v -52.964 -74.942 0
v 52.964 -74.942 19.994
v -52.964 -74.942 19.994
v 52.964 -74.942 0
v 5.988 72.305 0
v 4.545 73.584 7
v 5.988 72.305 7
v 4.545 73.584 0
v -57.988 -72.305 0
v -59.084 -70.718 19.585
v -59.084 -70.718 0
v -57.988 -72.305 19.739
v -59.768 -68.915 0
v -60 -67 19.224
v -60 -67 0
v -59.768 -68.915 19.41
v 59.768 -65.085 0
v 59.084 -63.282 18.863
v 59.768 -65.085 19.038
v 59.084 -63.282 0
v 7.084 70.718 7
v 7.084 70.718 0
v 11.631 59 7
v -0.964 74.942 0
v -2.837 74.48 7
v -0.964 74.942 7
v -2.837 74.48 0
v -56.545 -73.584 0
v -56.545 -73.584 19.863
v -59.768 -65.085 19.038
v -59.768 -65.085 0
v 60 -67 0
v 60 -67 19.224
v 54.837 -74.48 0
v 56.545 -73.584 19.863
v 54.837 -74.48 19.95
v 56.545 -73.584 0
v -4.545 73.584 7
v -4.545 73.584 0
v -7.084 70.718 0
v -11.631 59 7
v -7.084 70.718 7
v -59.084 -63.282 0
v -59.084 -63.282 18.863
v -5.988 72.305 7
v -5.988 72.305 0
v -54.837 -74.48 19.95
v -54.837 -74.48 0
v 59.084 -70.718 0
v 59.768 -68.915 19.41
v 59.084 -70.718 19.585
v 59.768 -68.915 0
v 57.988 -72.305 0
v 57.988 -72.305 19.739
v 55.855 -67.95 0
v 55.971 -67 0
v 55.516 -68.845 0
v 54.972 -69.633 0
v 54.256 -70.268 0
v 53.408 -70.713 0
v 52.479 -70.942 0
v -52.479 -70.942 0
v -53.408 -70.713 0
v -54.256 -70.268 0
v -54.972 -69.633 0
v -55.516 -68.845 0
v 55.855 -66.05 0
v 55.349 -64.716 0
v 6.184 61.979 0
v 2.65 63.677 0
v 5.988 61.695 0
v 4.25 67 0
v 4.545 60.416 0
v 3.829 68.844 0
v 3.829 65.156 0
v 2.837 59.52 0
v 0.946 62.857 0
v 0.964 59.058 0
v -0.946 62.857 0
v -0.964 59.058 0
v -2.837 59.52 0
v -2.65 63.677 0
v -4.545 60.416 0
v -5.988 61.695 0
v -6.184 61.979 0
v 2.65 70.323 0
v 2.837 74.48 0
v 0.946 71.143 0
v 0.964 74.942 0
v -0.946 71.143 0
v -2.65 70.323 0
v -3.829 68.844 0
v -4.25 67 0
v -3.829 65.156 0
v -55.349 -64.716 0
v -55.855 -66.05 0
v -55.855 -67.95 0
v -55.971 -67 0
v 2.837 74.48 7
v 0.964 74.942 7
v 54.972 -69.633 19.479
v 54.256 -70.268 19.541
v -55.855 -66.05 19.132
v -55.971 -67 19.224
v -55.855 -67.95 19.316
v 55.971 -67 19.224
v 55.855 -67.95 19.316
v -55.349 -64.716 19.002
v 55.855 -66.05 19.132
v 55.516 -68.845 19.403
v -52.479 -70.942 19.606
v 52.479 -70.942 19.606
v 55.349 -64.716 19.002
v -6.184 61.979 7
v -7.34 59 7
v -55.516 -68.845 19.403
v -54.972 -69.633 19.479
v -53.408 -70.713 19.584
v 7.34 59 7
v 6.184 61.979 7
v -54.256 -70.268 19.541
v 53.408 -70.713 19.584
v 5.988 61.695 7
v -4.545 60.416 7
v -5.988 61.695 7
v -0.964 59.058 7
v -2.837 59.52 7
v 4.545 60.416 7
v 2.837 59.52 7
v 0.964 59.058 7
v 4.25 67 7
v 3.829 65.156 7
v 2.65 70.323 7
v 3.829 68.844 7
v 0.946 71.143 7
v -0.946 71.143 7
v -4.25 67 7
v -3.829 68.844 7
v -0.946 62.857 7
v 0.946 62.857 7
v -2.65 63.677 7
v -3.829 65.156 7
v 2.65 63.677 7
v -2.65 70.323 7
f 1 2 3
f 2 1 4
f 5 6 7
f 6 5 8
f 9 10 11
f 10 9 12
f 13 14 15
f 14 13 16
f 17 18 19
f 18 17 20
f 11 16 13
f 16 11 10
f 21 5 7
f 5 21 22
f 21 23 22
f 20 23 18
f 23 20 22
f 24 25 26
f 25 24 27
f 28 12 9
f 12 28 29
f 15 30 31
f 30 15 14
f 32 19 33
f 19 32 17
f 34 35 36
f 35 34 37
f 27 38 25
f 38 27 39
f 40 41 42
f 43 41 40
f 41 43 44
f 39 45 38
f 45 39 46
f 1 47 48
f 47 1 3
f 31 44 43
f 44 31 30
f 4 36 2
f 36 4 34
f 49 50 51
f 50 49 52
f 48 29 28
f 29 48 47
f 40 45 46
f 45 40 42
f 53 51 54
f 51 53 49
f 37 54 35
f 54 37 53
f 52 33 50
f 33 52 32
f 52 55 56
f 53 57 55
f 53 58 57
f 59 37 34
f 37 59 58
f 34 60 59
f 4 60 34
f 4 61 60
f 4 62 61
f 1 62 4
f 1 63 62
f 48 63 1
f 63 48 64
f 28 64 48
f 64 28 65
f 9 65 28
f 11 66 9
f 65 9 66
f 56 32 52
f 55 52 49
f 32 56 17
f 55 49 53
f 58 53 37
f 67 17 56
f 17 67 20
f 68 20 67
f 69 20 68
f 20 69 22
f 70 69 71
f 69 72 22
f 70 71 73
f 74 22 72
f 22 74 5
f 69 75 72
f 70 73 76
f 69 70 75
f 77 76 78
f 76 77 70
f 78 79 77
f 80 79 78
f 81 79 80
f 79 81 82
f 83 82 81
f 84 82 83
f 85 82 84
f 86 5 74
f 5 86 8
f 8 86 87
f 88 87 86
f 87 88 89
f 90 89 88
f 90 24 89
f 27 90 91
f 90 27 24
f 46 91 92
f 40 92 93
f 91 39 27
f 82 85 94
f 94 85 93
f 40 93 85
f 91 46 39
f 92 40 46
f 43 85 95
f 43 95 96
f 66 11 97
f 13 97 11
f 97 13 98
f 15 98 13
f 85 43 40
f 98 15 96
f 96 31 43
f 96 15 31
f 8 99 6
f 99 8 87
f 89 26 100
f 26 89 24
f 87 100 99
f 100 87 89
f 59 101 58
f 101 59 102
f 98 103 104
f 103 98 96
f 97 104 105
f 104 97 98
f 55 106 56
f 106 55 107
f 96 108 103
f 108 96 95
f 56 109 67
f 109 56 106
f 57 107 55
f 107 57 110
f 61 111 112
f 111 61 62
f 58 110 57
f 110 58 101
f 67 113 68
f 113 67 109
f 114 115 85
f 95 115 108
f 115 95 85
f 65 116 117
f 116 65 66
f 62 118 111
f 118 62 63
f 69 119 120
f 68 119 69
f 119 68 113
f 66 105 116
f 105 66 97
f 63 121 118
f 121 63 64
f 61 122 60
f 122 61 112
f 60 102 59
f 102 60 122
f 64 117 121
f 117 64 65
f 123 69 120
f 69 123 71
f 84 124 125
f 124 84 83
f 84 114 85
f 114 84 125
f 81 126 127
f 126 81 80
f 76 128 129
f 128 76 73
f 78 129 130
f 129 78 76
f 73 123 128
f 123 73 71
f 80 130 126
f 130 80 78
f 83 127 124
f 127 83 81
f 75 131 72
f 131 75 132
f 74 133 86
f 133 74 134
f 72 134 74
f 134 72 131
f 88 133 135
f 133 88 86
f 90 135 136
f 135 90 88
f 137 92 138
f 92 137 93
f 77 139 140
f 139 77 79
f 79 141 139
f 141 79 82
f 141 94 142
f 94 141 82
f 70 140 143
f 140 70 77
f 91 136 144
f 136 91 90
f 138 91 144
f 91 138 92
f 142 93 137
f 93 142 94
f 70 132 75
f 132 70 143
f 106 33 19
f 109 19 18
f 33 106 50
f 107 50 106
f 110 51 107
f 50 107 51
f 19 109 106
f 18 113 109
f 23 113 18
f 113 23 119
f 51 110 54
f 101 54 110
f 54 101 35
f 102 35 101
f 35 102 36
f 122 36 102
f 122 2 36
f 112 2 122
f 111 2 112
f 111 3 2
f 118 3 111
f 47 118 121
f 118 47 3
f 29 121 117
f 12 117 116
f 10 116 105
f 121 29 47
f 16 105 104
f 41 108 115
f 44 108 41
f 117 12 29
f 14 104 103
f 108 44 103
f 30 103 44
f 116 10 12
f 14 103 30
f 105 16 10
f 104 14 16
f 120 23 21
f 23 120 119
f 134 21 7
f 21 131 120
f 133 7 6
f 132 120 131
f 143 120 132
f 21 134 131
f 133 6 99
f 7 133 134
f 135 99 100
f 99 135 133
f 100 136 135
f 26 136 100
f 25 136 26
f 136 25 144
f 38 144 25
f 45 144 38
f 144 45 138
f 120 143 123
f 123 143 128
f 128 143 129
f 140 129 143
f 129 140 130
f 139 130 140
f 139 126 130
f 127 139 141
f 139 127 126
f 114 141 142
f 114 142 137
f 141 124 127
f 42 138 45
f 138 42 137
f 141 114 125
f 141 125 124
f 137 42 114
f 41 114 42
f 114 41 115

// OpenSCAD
height = 150;
width = 120;
baseDepth = 20;
topDepth = 7;
wallThickness = 4;
rodDiameter = 8;
rodRadius = (rodDiameter+0.5)/2; // extra .5mm for clearance
cornerRadius = rodDiameter;

module triangle() {
	hull() {
		translate([0, height/2-cornerRadius, 0]) {
			circle(cornerRadius);
		}
		translate([-width/2+cornerRadius, -height/2+cornerRadius, 0]) {
			circle(cornerRadius);
		}
		translate([width/2-cornerRadius, -height/2+cornerRadius, 0]) {
			circle(cornerRadius);
		}
	}
}

difference() {
	union() {
		difference() {
			linear_extrude(baseDepth) {
				triangle();
			}
			translate([0, 0, -1]) {
				linear_extrude(baseDepth+2) {
					offset(-wallThickness) {
						triangle();
					}
				}
			}
		}

		// rod surrounding
		translate([0, height/2-cornerRadius, 0]) {
			cylinder(baseDepth, cornerRadius, cornerRadius);
		}
	}

	// rod hole
	translate([0, height/2-cornerRadius, -1]) {
		cylinder(baseDepth+2, rodRadius, rodRadius);
	}

	translate([-width/2, -height/2, baseDepth]) {
		rotate([-atan((baseDepth-topDepth)/(height-cornerRadius*2)), 0, 0]) {
			cube([width, sqrt(pow(baseDepth-topDepth, 2) + pow(height-cornerRadius*2, 2)), baseDepth]);
		}
	}
	translate([-cornerRadius*2, height/2-cornerRadius*2, topDepth]) {
		cube([cornerRadius*4, cornerRadius*2, baseDepth]);
	}
}
